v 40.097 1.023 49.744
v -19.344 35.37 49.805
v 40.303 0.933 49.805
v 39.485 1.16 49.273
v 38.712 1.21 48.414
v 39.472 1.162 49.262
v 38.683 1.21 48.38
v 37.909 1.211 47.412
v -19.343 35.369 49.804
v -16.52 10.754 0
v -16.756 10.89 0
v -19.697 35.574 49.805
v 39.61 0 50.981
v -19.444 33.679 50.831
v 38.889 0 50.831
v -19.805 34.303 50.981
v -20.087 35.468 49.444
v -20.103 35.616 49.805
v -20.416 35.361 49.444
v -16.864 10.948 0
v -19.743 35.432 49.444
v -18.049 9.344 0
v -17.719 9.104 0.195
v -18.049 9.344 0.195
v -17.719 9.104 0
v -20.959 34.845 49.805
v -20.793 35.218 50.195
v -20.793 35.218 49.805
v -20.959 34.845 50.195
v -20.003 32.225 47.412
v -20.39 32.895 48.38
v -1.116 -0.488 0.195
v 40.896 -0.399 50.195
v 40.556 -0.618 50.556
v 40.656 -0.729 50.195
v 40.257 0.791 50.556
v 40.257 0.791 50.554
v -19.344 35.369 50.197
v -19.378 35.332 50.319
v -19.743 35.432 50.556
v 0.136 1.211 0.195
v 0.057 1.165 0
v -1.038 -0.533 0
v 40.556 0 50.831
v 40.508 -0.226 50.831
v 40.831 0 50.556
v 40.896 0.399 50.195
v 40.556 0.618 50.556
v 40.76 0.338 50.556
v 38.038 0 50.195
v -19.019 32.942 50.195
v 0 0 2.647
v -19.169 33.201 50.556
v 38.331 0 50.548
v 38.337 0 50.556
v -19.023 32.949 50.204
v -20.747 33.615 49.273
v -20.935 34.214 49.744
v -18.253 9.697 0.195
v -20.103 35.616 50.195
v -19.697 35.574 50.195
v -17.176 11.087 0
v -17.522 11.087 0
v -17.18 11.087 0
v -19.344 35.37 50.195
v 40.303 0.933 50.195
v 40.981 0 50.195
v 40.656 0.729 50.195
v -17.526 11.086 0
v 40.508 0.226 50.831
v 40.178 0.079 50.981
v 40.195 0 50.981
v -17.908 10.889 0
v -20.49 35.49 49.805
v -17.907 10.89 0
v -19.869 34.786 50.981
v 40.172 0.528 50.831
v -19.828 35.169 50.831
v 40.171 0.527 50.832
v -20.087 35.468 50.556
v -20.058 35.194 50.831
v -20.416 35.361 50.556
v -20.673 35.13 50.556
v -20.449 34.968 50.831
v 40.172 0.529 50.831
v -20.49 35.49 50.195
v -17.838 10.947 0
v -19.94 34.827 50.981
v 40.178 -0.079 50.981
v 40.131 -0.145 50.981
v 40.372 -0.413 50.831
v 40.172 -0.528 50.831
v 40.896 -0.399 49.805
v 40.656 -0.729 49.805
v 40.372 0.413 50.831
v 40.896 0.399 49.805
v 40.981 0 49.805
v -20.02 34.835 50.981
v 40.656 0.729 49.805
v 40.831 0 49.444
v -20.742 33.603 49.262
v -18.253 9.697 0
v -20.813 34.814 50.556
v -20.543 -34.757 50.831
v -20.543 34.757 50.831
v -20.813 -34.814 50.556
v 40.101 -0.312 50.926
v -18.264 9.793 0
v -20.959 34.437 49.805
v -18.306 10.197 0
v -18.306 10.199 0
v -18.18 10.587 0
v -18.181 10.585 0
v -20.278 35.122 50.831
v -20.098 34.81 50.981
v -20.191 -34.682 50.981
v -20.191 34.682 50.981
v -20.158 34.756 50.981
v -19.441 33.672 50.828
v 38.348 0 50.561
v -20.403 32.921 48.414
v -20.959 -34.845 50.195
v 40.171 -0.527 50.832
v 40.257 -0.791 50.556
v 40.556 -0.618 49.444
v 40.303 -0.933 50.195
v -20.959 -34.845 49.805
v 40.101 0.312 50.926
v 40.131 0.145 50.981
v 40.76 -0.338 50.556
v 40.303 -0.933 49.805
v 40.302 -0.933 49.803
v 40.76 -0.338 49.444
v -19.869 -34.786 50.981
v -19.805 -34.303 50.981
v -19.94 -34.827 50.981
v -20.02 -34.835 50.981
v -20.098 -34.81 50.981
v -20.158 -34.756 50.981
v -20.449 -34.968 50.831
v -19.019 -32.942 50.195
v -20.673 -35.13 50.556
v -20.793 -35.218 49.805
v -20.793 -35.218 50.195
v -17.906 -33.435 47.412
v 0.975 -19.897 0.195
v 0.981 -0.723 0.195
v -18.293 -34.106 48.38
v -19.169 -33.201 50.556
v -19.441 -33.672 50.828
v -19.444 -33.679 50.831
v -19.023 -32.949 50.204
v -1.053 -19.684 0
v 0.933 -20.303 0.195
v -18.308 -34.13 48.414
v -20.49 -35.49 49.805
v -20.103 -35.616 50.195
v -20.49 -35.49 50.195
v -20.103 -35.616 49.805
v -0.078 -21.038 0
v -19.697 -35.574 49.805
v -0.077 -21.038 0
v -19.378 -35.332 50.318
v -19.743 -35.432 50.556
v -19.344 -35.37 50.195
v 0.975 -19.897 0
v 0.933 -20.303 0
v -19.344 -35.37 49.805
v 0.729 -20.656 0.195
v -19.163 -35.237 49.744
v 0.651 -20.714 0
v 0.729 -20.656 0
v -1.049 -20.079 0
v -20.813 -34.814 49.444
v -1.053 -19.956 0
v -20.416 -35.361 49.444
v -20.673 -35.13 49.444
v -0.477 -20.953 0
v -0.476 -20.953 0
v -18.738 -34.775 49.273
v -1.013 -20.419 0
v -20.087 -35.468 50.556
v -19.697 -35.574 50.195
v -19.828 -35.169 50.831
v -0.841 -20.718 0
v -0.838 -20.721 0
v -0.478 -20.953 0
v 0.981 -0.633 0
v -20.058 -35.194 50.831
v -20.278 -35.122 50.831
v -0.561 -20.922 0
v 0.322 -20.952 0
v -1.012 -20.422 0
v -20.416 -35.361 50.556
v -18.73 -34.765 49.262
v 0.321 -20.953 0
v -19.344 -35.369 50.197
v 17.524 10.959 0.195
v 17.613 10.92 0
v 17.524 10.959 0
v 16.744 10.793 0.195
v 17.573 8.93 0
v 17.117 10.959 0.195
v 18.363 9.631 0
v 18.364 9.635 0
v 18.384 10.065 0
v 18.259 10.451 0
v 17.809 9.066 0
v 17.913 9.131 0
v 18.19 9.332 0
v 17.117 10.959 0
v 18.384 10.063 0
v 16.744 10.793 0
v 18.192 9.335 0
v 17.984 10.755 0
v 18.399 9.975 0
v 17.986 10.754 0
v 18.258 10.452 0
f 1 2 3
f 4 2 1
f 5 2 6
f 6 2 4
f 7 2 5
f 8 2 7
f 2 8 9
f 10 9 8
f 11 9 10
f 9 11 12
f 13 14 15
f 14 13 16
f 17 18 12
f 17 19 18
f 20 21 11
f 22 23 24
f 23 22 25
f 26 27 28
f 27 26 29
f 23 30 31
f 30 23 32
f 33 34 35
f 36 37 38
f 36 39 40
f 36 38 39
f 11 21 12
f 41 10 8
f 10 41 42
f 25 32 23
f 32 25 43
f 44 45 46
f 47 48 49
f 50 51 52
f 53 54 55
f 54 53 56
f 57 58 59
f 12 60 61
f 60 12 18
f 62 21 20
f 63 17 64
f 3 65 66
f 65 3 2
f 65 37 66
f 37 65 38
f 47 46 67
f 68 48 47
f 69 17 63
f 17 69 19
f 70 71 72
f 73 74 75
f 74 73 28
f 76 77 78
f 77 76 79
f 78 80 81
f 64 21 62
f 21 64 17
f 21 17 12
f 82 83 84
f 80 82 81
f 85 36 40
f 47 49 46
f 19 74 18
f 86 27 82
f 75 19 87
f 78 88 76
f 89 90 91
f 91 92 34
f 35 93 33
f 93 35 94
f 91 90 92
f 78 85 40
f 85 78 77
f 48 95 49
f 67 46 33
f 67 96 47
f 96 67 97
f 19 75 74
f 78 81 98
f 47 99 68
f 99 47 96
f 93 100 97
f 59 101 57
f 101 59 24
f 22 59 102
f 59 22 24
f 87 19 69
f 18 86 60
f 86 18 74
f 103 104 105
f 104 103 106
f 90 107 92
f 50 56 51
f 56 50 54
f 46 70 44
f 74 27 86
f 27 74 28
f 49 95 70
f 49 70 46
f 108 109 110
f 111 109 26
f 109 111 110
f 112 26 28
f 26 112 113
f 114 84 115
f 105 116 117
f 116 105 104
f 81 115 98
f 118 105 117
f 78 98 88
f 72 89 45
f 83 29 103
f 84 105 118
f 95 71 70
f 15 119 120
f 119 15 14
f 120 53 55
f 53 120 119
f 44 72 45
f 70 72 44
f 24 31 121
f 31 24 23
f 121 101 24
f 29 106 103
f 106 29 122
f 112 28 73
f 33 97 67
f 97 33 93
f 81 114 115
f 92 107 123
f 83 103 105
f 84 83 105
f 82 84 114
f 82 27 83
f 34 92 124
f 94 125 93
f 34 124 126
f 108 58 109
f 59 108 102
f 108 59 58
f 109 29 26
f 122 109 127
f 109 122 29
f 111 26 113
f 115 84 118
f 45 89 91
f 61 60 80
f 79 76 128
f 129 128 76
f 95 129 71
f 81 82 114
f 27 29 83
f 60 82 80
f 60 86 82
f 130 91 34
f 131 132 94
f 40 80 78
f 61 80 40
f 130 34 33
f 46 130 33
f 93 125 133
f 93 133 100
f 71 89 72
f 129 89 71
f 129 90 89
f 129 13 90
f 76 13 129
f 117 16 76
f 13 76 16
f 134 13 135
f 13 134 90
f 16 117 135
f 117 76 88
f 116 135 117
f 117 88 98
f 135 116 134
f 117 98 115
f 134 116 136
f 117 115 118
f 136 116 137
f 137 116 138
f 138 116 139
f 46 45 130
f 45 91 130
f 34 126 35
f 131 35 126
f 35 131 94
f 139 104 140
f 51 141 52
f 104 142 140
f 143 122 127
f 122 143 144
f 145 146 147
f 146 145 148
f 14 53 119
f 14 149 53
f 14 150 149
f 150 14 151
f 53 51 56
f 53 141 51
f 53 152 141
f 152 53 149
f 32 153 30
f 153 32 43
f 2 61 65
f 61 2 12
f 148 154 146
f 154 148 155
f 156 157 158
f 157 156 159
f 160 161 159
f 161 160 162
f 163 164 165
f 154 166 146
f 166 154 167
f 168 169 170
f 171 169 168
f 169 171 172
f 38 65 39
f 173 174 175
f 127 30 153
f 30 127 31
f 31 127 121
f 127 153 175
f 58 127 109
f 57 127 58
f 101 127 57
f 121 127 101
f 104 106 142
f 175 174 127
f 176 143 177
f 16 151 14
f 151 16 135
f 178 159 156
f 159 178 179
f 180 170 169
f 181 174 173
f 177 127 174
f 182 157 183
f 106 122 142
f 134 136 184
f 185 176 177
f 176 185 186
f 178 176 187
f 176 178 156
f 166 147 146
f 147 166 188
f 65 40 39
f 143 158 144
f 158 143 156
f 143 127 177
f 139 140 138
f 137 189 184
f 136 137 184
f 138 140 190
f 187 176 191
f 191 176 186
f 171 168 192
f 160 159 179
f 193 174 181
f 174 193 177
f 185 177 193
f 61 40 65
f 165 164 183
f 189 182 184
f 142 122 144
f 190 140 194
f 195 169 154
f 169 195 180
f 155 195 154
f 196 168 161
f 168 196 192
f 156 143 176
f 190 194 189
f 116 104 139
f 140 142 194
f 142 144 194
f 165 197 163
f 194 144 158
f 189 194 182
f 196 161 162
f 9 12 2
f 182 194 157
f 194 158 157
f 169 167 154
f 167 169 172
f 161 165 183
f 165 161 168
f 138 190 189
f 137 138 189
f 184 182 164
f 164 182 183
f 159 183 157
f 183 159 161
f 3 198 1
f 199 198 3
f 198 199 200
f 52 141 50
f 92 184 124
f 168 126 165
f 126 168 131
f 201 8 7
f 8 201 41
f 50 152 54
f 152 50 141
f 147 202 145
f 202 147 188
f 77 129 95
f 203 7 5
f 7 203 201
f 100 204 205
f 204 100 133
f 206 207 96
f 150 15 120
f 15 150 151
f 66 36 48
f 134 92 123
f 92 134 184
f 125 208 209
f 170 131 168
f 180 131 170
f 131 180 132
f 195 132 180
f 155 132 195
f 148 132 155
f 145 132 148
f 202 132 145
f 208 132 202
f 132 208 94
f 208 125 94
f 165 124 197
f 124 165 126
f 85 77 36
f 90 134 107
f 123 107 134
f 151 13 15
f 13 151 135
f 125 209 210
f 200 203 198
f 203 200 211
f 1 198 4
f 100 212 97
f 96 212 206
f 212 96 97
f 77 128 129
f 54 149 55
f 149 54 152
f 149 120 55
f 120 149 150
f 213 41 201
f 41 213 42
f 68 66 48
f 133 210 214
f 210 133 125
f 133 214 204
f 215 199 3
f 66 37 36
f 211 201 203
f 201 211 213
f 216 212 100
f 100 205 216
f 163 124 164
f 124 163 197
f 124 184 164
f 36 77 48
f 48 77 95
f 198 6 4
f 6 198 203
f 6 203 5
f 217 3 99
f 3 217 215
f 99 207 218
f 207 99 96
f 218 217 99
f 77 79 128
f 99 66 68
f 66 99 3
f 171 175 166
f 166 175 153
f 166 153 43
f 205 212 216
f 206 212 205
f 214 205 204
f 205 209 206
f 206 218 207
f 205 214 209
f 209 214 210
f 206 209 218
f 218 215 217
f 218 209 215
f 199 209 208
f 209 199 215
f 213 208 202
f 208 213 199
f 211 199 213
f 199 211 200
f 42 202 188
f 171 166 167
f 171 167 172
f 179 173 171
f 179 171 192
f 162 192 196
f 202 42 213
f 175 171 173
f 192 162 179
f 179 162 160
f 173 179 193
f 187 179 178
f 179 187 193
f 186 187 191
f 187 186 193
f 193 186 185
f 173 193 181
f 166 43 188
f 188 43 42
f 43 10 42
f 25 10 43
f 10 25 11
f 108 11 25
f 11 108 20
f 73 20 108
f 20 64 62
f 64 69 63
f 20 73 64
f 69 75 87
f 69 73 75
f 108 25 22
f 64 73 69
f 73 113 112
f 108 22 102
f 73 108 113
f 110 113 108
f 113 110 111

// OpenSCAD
/* parametric Delta vase inspired by 
   http://www.thingiverse.com/thing:150482
   from the original design by Mart van Schijndel

   generaised to n sides

   Each side is constructed by hulling spheres positioned 
   at the corners of the plane of the face.  Three of the
   points are straightforward to position but the fourth
   needs to be placed so that the bottom edge is parallel
   to the top edge,
*/
 
// length of top edge
top=40;
// length of bottom edge
bottom=20;
// height of vase
height=50;
// wall thickness
thickness=1;
// number of sides
nsides=3;

module side(angle,top,bottom,height,thickness) {
   hull() {
        translate([top,0,height]) sphere(thickness);  
        rotate([0,0,angle])
            translate([top,0,height]) sphere(thickness);
        translate([0,0,0]) sphere(thickness);
        rotate([0,0,angle+(180-angle)/2])
            translate([bottom,0,0]) sphere(thickness);
    }
}

module delta_vase(nsides,top,bottom,height,thickness) {
    assign(angle=360/nsides)
    for (i = [0:nsides-1])
      rotate([0,0,i*angle])
         side(angle,top,bottom,height,thickness);
}

module ground(size=50) {
   translate([0,0,-size]) cube(2*size,center=true);
}

$fn=15;

difference()  {
  delta_vase(nsides,top,bottom,height,thickness);
  ground();
}
